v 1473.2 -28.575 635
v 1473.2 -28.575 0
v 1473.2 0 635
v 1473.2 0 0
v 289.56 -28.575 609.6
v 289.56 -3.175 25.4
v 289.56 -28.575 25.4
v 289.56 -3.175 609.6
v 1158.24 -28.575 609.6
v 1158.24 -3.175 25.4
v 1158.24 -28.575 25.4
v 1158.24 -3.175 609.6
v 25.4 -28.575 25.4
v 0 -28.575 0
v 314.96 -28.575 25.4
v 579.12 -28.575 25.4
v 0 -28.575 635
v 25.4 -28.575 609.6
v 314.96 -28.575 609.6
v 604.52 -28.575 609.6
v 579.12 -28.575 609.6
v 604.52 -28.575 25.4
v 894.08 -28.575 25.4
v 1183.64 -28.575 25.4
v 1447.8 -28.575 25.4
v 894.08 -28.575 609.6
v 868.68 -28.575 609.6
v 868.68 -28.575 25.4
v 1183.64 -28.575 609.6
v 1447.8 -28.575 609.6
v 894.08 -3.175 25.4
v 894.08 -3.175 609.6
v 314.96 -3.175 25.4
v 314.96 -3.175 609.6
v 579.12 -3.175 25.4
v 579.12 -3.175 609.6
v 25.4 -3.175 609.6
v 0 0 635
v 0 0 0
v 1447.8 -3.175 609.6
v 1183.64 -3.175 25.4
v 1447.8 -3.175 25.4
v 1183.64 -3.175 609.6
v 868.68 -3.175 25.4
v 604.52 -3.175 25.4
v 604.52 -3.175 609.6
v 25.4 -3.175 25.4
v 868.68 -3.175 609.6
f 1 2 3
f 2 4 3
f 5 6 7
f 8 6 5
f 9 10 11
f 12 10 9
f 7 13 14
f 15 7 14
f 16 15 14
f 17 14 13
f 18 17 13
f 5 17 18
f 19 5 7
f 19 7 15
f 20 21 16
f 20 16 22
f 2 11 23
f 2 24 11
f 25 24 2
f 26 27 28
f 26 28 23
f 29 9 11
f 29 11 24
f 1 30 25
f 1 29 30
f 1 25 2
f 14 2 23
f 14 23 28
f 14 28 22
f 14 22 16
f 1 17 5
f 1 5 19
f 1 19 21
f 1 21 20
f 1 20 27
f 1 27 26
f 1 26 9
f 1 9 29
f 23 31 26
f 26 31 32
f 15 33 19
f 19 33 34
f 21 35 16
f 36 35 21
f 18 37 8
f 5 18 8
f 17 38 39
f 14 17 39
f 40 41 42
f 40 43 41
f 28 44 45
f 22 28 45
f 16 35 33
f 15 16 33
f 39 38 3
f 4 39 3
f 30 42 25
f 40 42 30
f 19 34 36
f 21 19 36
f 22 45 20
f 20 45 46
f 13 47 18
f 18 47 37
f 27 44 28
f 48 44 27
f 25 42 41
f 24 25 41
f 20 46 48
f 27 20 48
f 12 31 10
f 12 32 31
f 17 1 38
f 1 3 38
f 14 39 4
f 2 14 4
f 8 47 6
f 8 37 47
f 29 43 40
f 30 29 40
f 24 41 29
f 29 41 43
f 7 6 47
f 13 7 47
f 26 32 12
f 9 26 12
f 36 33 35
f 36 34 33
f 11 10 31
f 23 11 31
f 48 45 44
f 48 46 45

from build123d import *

# Parameters (mm, degrees)
F0_W     = 1473.2
F0_H     = 635
F1_DEPTH = 3.175
F2_W     = 25.4
F2_H     = 584.2
F3_DEPTH = 25.4


with BuildPart() as f1:
    # F0 (on Front) → F1 (new body)
    with BuildSketch(Plane.XZ):
        with Locations((736.6, 317.5)):
            Rectangle(F0_W, F0_H)
    extrude(amount=F1_DEPTH)

    # F2 (on face) → F3 (join)
    with BuildSketch(Plane.XZ.offset(3.175)):
        Polygon((0, 25.4), (0, 0), (1473.2, 0), (1473.2, 25.4), (1447.8, 25.4), (1183.64, 25.4), (1158.24, 25.4), (894.08, 25.4), (868.68, 25.4), (604.52, 25.4), (579.12, 25.4), (314.96, 25.4), (289.56, 25.4), (25.4, 25.4), align=None)
        with Locations((12.7, 317.5)):
            Rectangle(F2_W, F2_H)
        with Locations((1460.5, 317.5)):
            Rectangle(F2_W, F2_H)
        Polygon((0, 635), (0, 609.6), (25.4, 609.6), (289.56, 609.6), (314.96, 609.6), (579.12, 609.6), (604.52, 609.6), (868.68, 609.6), (894.08, 609.6), (1158.24, 609.6), (1183.64, 609.6), (1447.8, 609.6), (1473.2, 609.6), (1473.2, 635), align=None)
        with Locations((302.26, 317.5)):
            Rectangle(F2_W, F2_H)
        with Locations((591.82, 317.5)):
            Rectangle(F2_W, F2_H)
        with Locations((881.38, 317.5)):
            Rectangle(F2_W, F2_H)
        with Locations((1170.94, 317.5)):
            Rectangle(F2_W, F2_H)
    extrude(amount=F3_DEPTH)


solid = f1.part
